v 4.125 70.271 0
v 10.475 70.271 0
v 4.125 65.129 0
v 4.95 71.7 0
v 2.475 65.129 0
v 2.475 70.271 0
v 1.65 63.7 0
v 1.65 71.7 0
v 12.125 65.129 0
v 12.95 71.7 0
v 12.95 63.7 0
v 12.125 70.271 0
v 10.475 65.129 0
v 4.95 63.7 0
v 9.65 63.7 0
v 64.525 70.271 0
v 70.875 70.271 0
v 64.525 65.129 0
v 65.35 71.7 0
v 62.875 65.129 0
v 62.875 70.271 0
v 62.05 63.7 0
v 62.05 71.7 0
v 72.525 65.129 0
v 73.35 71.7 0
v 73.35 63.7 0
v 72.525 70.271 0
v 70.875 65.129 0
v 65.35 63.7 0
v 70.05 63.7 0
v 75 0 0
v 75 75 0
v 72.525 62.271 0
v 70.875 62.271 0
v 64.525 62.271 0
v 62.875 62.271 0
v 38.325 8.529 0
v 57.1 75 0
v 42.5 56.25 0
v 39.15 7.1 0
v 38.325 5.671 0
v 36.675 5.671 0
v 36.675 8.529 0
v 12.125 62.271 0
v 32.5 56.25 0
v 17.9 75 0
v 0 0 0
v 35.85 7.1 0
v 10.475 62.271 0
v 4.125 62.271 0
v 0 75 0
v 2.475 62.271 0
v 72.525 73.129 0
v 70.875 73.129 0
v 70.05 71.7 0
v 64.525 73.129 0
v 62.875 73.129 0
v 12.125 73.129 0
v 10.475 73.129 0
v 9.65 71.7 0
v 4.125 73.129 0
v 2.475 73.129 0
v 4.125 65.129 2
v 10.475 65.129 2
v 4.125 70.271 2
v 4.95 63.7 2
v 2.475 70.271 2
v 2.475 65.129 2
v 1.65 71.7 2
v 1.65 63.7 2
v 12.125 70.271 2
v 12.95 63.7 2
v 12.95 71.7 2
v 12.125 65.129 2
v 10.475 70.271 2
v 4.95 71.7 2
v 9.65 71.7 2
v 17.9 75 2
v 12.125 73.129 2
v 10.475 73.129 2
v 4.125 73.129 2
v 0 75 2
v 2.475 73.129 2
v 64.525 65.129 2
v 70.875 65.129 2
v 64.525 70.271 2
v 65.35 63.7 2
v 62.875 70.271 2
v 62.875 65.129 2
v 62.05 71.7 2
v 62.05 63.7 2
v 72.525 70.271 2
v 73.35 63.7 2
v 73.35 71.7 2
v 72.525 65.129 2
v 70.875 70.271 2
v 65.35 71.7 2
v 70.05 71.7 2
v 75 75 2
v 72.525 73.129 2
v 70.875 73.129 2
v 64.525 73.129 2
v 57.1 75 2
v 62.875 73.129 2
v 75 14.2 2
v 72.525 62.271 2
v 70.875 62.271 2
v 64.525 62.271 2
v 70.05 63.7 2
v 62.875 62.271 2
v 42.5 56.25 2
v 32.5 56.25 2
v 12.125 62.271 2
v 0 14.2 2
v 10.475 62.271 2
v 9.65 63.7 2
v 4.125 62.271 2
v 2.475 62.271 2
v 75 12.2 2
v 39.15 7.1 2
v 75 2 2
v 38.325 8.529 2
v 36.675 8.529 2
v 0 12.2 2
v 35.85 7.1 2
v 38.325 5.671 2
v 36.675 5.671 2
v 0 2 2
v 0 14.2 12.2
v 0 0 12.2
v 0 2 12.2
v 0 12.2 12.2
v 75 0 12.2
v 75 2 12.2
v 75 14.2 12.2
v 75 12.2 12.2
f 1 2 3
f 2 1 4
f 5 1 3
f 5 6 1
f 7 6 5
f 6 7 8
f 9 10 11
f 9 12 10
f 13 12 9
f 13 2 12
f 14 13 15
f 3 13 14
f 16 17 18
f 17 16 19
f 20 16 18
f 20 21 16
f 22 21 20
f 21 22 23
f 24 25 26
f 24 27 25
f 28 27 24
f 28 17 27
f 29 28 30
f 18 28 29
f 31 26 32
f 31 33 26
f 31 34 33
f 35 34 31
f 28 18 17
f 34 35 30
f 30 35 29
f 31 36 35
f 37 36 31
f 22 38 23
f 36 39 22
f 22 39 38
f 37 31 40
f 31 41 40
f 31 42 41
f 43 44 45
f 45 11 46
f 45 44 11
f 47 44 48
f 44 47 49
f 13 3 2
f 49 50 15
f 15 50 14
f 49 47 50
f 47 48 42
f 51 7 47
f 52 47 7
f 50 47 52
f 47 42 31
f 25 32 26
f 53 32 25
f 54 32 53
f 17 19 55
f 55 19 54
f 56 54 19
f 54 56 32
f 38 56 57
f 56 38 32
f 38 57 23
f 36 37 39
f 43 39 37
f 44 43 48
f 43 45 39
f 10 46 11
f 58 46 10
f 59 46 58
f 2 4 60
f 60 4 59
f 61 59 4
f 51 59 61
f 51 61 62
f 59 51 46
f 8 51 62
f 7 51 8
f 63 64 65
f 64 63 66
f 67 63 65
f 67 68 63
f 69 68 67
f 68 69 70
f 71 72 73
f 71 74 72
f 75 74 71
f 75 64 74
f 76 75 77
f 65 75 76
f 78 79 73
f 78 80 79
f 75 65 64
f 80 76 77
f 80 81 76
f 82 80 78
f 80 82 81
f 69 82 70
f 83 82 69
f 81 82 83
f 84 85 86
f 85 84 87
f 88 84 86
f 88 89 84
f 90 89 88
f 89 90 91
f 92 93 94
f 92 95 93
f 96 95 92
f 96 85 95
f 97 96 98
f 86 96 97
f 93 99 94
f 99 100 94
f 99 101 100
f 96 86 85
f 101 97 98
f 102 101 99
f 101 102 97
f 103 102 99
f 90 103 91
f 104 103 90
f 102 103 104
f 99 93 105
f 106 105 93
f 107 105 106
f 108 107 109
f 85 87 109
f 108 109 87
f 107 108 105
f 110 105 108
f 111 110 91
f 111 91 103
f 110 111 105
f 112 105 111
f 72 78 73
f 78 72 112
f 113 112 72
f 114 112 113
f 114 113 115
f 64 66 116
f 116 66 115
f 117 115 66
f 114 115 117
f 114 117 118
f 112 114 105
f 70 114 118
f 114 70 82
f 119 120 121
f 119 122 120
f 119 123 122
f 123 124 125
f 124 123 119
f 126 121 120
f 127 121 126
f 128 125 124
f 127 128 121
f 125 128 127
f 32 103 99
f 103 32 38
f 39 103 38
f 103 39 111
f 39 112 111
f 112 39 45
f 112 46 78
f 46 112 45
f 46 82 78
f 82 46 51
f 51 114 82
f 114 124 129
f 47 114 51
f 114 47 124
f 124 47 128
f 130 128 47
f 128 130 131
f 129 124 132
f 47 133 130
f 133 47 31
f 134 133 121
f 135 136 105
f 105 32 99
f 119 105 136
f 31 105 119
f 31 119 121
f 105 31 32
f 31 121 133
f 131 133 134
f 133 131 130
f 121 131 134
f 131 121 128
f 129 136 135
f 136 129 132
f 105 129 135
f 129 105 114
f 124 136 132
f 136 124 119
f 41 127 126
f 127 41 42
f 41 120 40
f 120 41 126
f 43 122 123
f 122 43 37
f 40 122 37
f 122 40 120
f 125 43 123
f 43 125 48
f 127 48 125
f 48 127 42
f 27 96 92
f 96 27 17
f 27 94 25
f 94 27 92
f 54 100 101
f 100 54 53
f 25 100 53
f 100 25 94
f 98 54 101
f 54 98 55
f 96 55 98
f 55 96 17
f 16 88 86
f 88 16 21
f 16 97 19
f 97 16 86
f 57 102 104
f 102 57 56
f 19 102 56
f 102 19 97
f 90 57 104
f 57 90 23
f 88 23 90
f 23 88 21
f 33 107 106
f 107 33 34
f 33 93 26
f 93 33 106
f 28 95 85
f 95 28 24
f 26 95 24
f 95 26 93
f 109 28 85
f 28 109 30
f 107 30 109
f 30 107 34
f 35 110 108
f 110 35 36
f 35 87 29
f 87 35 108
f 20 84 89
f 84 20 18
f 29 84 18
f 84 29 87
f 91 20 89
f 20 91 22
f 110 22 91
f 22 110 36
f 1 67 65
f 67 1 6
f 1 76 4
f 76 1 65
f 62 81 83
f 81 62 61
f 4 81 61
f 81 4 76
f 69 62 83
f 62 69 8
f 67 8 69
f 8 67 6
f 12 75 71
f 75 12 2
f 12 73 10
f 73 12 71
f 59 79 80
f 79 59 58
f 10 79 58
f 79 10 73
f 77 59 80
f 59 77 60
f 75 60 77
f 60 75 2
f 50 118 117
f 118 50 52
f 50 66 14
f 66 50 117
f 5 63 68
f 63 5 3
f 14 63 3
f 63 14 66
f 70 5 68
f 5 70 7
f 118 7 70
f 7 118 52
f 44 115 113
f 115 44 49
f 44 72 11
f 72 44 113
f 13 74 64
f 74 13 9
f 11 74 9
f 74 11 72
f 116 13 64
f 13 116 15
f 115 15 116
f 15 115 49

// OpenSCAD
eps = 0.3;

s = 2;

l = 75; //length from bed screw on in the direction of the aluminium profile
w = 75; //width from the aluminium profile to the outer profile where the chain is

profile_w = 10.2; //profile width of bed holding profiles
shr = (3+eps) /2; //screw hole radius of bed screw
shr_chain = (3+eps) /2; //screw hole radius of cable chain
sd_chain = 8; //screw distance of cable chain end piece (distance from center of the screw holes


difference() {
    //main part
    union() {
        linear_extrude(s) polygon([[0,0],[l,0],[l,w],[l-sd_chain-6*shr_chain,w],[l/2+5,w*0.75],[l/2-5,w*0.75],[sd_chain+6*shr_chain,w],[0,w],[0,profile_w+2*s]]);
        translate([0,0,s])cube([l,s,profile_w]);
        translate([0,profile_w+s,s])cube([l,s,profile_w]);
    }
    
    //screw hole for bed screw for fixing part
    translate([l/2,s+profile_w/2,0]) cylinder(s,shr,shr);
    
    //cable chain screw holes
    translate([l-2*shr_chain,w-2*shr_chain,0]) cylinder(s,shr_chain,shr_chain);
    translate([l-2*shr_chain-sd_chain,w-2*shr_chain,0]) cylinder(s,shr_chain,shr_chain);
    translate([l-2*shr_chain,w-2*shr_chain-sd_chain,0]) cylinder(s,shr_chain,shr_chain);
    translate([l-2*shr_chain-sd_chain,w-2*shr_chain-sd_chain,0]) cylinder(s,shr_chain,shr_chain);

    translate([2*shr_chain,w-2*shr_chain,0]) cylinder(s,shr_chain,shr_chain);
    translate([2*shr_chain+sd_chain,w-2*shr_chain,0]) cylinder(s,shr_chain,shr_chain);
    translate([2*shr_chain,w-2*shr_chain-sd_chain,0]) cylinder(s,shr_chain,shr_chain);
    translate([2*shr_chain+sd_chain,w-2*shr_chain-sd_chain,0]) cylinder(s,shr_chain,shr_chain);


}
